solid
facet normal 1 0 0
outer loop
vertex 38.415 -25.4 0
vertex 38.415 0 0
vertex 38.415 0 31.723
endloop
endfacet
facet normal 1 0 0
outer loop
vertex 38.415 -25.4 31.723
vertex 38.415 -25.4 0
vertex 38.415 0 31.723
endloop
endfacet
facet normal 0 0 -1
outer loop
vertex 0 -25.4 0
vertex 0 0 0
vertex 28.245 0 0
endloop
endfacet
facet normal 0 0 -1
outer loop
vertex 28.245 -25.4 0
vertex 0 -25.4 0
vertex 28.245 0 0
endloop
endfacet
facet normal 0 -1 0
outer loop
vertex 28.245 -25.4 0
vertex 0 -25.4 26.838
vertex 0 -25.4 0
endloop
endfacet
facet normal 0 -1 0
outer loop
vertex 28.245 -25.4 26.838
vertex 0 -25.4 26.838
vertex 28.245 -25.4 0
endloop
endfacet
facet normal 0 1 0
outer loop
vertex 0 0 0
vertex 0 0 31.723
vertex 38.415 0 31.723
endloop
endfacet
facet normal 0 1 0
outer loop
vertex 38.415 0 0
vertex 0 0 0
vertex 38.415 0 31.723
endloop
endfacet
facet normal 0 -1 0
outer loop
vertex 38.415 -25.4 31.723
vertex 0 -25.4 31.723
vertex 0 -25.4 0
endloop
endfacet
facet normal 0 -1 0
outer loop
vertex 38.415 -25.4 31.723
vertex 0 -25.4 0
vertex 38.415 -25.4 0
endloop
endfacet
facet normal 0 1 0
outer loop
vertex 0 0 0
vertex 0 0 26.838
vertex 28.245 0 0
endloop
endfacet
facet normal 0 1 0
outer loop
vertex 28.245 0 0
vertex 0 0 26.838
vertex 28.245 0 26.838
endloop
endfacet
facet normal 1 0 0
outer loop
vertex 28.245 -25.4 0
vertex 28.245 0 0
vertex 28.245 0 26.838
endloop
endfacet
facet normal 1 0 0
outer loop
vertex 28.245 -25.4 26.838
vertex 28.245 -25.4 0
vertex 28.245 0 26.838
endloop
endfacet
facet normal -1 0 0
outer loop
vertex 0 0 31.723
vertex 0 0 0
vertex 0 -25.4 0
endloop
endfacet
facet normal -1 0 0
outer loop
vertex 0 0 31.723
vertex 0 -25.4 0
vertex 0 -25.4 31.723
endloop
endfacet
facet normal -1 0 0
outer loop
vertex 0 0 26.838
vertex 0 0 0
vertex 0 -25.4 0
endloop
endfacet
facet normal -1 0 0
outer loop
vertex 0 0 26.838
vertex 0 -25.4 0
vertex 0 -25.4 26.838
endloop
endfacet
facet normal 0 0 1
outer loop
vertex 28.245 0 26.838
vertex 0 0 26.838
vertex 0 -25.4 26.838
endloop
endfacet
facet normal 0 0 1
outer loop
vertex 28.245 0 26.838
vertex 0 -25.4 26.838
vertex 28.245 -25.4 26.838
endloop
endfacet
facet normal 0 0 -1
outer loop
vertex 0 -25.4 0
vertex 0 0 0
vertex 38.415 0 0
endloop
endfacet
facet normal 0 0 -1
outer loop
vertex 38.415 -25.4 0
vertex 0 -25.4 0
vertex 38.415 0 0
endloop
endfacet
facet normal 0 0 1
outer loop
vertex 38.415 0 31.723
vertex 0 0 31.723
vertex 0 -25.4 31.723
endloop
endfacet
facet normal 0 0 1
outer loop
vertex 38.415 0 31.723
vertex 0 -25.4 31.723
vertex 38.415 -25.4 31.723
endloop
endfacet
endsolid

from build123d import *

# Parameters (mm, degrees)
F0_W     = 28.2447356731
F0_H     = 26.8375258893
F2_DEPTH = 25.4
F1_W     = 38.4147167206
F1_H     = 31.7230820656
F3_DEPTH = 25.4


# Not quite as in the source:
# - a feature of the source that left no trace in its solid (it failed there, or was rolled back) is left out


with BuildPart() as f2:
    # F0 (on Front) → F2 (new body)
    with BuildSketch(Plane.XZ):
        with Locations((14.1223678365, 13.4187629446)):
            Rectangle(F0_W, F0_H)
    extrude(amount=F2_DEPTH)


with BuildPart() as f3:
    # F1 (on Front) → F3 (new body)
    with BuildSketch(Plane.XZ):
        with Locations((19.2073583603, 15.8615410328)):
            Rectangle(F1_W, F1_H)
    extrude(amount=F3_DEPTH)


solid = Compound([f2.part, f3.part])
